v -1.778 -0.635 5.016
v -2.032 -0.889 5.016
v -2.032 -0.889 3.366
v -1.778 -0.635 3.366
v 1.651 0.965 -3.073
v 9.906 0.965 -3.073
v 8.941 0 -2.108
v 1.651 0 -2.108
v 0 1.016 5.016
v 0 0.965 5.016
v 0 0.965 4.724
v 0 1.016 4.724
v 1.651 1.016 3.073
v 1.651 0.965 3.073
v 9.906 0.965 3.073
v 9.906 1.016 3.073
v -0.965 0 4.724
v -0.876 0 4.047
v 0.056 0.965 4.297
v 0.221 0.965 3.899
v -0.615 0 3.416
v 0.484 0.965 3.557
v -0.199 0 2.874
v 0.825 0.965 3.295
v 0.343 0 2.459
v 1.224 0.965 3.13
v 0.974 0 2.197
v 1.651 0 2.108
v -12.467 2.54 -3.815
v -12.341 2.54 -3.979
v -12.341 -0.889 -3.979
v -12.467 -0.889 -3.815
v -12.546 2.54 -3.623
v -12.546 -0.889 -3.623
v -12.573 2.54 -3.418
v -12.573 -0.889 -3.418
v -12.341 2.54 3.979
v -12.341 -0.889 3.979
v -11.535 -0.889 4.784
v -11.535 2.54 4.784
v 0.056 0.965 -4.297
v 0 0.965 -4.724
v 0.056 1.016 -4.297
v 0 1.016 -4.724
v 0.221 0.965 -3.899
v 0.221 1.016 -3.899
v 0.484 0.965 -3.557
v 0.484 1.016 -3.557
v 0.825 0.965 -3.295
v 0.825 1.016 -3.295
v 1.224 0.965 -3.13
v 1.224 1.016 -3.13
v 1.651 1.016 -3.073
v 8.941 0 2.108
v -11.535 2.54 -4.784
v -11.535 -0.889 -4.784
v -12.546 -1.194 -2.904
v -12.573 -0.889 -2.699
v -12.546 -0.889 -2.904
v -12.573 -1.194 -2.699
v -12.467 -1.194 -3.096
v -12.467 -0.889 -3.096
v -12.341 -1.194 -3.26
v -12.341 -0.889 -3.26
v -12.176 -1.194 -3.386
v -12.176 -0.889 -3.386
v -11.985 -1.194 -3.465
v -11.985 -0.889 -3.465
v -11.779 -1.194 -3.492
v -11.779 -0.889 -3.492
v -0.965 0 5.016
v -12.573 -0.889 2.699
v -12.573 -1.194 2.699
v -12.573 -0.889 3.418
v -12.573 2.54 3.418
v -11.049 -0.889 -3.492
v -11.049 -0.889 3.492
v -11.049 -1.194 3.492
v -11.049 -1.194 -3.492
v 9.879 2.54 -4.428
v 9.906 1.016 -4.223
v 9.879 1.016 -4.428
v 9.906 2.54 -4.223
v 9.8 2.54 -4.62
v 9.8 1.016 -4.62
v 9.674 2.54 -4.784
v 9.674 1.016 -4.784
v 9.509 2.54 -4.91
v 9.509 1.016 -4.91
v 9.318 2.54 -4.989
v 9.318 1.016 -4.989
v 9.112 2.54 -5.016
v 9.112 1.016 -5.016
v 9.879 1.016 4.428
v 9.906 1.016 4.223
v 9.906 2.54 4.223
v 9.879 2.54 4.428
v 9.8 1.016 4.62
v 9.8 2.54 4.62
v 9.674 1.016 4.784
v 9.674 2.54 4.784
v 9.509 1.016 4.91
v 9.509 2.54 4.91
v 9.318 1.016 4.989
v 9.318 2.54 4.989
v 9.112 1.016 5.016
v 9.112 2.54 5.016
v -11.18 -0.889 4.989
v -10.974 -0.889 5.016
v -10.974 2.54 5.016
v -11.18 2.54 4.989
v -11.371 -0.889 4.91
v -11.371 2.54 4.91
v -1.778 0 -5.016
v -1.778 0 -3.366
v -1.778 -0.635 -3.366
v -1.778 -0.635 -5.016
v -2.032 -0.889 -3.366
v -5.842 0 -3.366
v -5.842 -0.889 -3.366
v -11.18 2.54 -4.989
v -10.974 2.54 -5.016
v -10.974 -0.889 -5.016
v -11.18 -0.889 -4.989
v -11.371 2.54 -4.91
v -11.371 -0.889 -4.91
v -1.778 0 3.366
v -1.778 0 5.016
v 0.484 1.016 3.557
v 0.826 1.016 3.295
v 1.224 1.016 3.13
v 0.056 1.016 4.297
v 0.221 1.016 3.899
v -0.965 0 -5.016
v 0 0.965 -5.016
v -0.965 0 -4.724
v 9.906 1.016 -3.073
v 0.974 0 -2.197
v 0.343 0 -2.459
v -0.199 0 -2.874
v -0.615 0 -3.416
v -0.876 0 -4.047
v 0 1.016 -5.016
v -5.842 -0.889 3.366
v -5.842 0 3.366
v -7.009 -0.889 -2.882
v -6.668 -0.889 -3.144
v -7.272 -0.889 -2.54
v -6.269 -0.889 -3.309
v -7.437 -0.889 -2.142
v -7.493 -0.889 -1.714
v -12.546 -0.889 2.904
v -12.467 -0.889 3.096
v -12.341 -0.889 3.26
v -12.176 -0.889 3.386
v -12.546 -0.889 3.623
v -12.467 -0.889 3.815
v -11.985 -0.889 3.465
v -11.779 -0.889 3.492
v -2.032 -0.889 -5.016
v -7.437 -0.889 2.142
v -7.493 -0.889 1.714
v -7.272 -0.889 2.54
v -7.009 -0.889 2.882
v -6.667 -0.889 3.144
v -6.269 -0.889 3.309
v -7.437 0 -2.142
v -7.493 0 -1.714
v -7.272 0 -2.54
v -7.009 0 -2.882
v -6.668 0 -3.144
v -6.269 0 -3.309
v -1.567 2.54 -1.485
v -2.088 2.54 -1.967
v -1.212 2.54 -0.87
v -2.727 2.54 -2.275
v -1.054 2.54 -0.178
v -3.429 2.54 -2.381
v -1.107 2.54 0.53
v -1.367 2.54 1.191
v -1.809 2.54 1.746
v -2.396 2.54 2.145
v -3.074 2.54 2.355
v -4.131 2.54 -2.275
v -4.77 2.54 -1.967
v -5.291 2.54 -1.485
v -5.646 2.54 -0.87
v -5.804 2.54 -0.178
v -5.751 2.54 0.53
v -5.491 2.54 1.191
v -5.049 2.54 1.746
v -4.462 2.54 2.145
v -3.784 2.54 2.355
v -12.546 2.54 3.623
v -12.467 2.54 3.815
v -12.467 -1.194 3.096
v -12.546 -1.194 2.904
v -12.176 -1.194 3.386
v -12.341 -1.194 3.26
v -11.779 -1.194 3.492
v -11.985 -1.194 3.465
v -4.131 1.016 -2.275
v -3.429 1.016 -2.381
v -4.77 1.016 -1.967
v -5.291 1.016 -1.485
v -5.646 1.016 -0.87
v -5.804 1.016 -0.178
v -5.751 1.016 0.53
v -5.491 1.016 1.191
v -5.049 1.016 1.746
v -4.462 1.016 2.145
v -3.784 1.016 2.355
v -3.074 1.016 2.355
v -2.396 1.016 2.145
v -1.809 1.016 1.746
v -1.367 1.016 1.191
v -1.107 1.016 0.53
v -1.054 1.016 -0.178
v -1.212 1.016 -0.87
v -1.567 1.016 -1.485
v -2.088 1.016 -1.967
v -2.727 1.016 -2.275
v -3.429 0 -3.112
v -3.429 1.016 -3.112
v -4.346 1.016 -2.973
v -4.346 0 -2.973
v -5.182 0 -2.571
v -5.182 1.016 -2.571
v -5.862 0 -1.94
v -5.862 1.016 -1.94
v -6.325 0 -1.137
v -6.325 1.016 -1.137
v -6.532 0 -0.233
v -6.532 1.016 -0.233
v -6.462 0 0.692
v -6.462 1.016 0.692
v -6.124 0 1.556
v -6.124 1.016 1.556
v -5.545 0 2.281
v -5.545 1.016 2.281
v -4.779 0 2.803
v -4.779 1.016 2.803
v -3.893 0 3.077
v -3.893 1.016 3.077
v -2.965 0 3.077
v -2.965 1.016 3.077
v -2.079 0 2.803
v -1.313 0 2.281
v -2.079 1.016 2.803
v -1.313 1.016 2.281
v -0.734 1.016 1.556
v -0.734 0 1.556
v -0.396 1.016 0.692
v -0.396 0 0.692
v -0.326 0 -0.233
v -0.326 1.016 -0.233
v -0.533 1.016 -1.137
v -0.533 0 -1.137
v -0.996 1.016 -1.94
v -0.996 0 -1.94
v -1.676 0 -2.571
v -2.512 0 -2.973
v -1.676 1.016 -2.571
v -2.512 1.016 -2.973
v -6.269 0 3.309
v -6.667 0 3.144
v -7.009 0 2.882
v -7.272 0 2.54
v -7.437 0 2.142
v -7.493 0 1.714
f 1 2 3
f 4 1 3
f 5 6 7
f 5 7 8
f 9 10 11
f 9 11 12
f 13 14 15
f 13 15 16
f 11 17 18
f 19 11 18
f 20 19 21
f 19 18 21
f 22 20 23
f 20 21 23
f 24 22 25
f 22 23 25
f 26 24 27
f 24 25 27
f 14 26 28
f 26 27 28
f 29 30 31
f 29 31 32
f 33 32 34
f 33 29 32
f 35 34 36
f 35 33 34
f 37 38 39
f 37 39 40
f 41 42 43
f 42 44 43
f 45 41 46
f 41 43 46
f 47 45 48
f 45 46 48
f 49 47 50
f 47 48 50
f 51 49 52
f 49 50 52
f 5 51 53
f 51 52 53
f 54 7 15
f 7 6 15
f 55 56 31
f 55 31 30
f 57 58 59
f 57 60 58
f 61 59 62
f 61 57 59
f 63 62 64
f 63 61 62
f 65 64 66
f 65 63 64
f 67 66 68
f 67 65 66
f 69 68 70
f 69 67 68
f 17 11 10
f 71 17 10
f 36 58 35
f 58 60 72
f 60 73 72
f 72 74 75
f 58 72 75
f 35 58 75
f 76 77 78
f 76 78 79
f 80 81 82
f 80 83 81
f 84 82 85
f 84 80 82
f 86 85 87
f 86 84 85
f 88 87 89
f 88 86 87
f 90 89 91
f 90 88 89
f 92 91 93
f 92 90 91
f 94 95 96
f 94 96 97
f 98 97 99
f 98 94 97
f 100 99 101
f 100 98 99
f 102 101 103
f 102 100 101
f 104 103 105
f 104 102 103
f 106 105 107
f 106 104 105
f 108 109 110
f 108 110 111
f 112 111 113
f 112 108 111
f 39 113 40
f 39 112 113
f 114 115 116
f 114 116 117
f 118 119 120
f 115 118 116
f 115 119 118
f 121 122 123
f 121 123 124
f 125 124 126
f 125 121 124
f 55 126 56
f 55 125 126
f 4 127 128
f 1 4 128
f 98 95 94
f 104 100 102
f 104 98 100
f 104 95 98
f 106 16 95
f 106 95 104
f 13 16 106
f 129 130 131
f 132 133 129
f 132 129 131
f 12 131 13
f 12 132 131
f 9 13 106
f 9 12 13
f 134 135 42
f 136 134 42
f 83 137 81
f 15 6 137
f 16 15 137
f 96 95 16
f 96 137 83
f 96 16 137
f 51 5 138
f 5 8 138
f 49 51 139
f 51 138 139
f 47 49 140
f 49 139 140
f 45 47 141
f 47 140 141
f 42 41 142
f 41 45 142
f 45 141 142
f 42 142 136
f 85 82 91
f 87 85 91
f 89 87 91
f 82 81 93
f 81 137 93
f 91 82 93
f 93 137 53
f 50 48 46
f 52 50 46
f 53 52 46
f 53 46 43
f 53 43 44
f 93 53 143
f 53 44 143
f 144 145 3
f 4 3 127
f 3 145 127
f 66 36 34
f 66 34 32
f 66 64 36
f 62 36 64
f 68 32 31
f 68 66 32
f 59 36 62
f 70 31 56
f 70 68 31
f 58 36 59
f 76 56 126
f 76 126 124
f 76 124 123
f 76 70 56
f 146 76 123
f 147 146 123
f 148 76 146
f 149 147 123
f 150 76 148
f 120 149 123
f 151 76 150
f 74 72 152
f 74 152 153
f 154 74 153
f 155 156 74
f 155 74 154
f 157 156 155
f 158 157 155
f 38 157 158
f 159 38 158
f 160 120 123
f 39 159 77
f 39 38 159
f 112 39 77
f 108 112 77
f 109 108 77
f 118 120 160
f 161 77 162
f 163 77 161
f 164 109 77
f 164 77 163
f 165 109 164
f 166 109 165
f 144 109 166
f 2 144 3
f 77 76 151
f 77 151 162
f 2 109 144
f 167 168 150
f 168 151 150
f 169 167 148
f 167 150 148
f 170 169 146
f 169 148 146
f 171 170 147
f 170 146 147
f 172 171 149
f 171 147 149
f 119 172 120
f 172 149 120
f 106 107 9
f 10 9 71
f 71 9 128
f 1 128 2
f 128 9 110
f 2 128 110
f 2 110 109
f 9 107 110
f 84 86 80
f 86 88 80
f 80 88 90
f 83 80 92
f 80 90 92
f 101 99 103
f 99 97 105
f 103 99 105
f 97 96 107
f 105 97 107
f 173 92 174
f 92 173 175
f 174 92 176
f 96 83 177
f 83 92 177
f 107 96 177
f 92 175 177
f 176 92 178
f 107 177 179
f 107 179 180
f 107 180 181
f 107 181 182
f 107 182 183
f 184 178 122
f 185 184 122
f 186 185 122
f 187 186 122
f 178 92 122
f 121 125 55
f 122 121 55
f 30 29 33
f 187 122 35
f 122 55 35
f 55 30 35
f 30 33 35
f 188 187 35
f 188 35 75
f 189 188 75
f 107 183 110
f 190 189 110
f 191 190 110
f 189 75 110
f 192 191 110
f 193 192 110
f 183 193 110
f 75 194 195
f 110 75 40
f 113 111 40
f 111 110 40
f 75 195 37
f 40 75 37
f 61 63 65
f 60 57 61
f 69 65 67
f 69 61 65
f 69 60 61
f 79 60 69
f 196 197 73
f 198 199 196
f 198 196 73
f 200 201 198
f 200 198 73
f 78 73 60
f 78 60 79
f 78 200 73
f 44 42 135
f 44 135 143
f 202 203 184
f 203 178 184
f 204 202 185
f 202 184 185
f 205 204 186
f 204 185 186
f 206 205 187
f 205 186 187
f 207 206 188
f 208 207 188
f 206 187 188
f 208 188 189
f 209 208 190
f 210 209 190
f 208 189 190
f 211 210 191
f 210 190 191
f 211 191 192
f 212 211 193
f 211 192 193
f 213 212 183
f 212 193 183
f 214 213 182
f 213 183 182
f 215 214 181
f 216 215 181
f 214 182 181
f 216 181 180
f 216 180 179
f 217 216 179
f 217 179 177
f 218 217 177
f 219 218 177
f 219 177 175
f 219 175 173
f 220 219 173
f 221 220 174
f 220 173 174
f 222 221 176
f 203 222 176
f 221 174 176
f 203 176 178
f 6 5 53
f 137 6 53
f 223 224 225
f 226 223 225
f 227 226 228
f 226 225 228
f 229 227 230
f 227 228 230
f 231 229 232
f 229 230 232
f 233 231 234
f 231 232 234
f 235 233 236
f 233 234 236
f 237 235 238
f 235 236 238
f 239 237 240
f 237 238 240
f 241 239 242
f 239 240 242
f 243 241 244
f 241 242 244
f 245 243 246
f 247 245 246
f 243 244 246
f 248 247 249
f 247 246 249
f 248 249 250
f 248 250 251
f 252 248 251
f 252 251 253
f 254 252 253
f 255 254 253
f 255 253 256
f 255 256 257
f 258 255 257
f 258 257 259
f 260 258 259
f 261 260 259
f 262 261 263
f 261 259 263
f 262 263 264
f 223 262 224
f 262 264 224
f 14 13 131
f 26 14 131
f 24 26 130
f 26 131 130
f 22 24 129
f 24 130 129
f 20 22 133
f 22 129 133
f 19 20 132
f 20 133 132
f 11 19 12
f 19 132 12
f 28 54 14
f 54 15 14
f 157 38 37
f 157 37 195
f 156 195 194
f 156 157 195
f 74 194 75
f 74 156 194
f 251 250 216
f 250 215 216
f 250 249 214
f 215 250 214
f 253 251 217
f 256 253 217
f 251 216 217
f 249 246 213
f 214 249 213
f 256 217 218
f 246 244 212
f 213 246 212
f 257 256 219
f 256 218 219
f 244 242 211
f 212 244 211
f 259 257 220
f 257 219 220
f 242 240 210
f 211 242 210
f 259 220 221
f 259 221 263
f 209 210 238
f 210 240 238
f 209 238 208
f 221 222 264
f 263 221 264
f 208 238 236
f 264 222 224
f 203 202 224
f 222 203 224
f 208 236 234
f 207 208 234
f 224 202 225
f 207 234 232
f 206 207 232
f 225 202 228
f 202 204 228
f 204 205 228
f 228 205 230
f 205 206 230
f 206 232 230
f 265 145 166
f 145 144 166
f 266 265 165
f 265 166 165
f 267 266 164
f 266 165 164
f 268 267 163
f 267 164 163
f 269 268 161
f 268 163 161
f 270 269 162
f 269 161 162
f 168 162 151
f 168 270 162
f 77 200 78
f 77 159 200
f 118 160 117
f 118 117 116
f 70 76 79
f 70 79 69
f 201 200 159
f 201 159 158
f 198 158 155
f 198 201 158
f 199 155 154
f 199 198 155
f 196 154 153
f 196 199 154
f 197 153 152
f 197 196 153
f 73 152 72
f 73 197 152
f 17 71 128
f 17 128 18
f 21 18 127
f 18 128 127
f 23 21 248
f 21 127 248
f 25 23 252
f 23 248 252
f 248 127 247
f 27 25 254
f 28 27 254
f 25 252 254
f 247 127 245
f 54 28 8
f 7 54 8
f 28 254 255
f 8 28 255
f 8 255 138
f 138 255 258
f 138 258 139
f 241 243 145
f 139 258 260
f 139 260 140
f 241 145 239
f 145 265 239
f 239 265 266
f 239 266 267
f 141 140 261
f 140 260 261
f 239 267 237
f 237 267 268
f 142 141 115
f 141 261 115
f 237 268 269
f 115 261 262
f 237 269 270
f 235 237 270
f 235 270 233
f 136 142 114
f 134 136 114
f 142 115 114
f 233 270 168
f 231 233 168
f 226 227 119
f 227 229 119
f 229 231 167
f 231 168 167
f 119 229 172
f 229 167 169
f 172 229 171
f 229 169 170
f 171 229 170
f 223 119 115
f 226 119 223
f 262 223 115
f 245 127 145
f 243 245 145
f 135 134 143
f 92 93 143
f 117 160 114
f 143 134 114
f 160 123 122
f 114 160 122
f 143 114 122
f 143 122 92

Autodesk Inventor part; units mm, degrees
ref_plane "YZ Plane" through (0, 0, 0) normal (1, 0, 0) x (0, 1, 0)
ref_plane "XZ Plane" through (0, 0, 0) normal (0, 1, 0) x (-1, 0, 0)
ref_plane "XY Plane" through (0, 0, 0) normal (0, 0, 1) x (1, 0, 0)
sketch "Sketch1" plane through (0, 0, 0) normal (1, 0, 0) x (0, 1, 0)
  line L0 (-2.1432, 0) -> (4.5023, 0) projected
  line L1 (0, 7.0231) -> (0, -7.0231) projected
  line L2 (2.54, -5.0165) -> (2.54, 5.0165)
  line L3 (2.54, 5.0165) -> (0, 5.0165)
  line L4 (0, 5.0165) -> (0, -5.0165)
  line L5 (0, -5.0165) -> (2.54, -5.0165)
  line L6 (2.54, -5.0165) -> (0, 5.0165) construction
  line L7 (2.54, 5.0165) -> (0, -5.0165) construction
  line L8 (0, 3.0734) -> (1.016, 3.0734)
  line L9 (1.016, 3.0734) -> (1.016, 5.0165)
  line L10 (0, -3.0734) -> (1.016, -3.0734)
  line L11 (1.016, -3.0734) -> (1.016, -5.0165)
  line L12 (1.27, 0) -> (3.553, 0) construction
  point P0 (0, 0)
  dimension "d0" = 10.033
  dimension "d1" = 2.54
  dimension "d2" = 0
  dimension "d3" = 1.016
  dimension "d4" = 6.1468
  dimension "d5" = 1.9431
  dimension "d6" = 1.9431
extrude "Extrusion1" add sketch "Sketch1" along normal blind 9.906 contours L1 L8 L9 L3 L2 L0 | L0 L2 L5 L11 L10 L1
extrude "Extrusion2" add sketch "Sketch1" against normal blind 12.573
sketch "Sketch2" plane through (0, 0, 0) normal (0, 1, 0) x (-1, 0, 0)
  line L0 (-2.3558, 0) -> (14.1351, 0) projected
  line L1 (0, -4.445) -> (0, 4.445) projected
  point P0 (0, 0)
  point P1 (3.429, 0)
  dimension "d11" = 3.429
hole "Hole1" at (-3.429, 0, 0) direction (0, 1, 0) diameter 4.7625 end through all counterbore diameter 6.223 counterbore depth 1.016
sketch "Sketch3" plane through (9.906, 0, -3.0734) normal (0, -1, 0) x (1, 0, 0)
  line L0 (-22.479, 6.4389) -> (-17.399, 6.4389)
  line L1 (-17.399, 6.4389) -> (-17.399, -0.2921)
  line L2 (-17.399, -0.2921) -> (-22.479, -0.2921)
  line L3 (-22.479, -0.2921) -> (-22.479, 6.4389)
  line L4 (-34.3558, 3.0734) -> (5.726, 3.0734) projected
  line L5 (-9.906, 10.1016) -> (-9.906, -3.9802) projected
  line L6 (-9.906, 3.0734) -> (-28.6298, 3.0734) construction
  line L7 (-22.479, 8.0899) -> (0, 8.0899) projected
  line L8 (-22.479, 6.4389) -> (-11.684, 6.4389)
  line L9 (-11.684, 6.4389) -> (-11.684, 8.0899)
  line L10 (-11.684, 8.0899) -> (-22.479, 8.0899)
  line L11 (-22.479, 8.0899) -> (-22.479, 6.4389)
  line L12 (0, -1.9431) -> (-22.479, -1.9431) projected
  line L13 (-22.479, -0.2921) -> (-11.684, -0.2921)
  line L14 (-11.684, -0.2921) -> (-11.684, -1.9431)
  line L15 (-11.684, -1.9431) -> (-22.479, -1.9431)
  line L16 (-22.479, -1.9431) -> (-22.479, -0.2921)
  dimension "d22" = 5.08
  dimension "d30" = 6.731
  dimension "d45" = 10.795
  dimension "d46" = 10.795
extrude "Extrusion3" add sketch "Sketch3" along normal blind 0.889 contours L11 L7 L9 L8 L0 | L0 L1 L4 L3 | L4 L1 L2 L3 | L2 L13 L14 L12 L16
chamfer "Chamfer2" distance 0.254 angle 45 2 edges at (-1.778, -0.889, 4.191) (-1.778, -0.889, -4.191)
fillet "Fillet1" radius 0.7937 2 edges at (9.906, 1.778, 5.0165) (9.906, 1.778, -5.0165)
fillet "Fillet2" [suppressed]
sketch "Sketch4" plane through (0, 0, 0) normal (0, 1, 0) x (-1, 0, 0)
  circle A0 centre (3.429, 0) radius 2.3813 projected
  circle A1 centre (3.429, 0) radius 3.175
  point P0 (0, 0)
  dimension "d34" = 6.35
sketch "Sketch5" plane through (9.906, -0.889, -3.0734) normal (0, -1, 0) x (1, 0, 0)
  line L0 (-26.9748, 3.0734) -> (4.4958, 3.0734) projected
  line L1 (-9.906, 10.0965) -> (-9.906, -3.9497) projected
  line L2 (-22.479, 8.0899) -> (-22.479, -1.9431) projected
  line L3 (-20.955, -0.4191) -> (-22.479, -0.4191)
  line L4 (-22.479, -0.4191) -> (-22.479, 6.5659)
  line L5 (-22.479, 6.5659) -> (-20.955, 6.5659)
  line L6 (-20.955, 6.5659) -> (-20.955, -0.4191)
  line L7 (-20.955, -0.4191) -> (-22.479, 6.5659) construction
  line L8 (-22.479, -0.4191) -> (-20.955, 6.5659) construction
  point P0 (-9.906, 3.0734)
  point P1 (-21.717, 3.0734)
  dimension "d47" = 6.985
  dimension "d48" = 1.524
extrude "Extrusion4" add sketch "Sketch5" along normal blind 0.3048
chamfer "Chamfer4" distance 1.27 distance2 1.27 1 edges at (-12.573, 0.8255, -5.0165) measured on face at (-12.573, 1.397, 1.1642)
chamfer "Chamfer5" distance 1.27 distance2 1.27 1 edges at (-12.573, 0.8255, 5.0165) measured on face at (-9.0593, 0.254, 5.0165)
fillet "Fillet4" radius 0.7937 2 edges at (-12.573, -1.0414, -3.4925) (-12.573, -1.0414, 3.4925)
fillet "Fillet5" radius 0.7937 4 edges at (-12.573, 0.8255, 3.7465) (-11.303, 0.8255, 5.0165) (-12.573, 0.8255, -3.7465) (-11.303, 0.8255, -5.0165)
fillet "Fillet6" radius 1.651 4 edges at (0, 0.508, -3.0734) (0, 0.508, 3.0734) (-7.493, -0.4445, 3.3655) (-7.493, -0.4445, -3.3655)
sketch "Sketch6" plane through (0, 0, 0) normal (0, 0, 1) x (1, 0, 0)
  line L0 (-11.049, -1.1938) -> (-11.7793, -1.1938) projected
  line L1 (-11.049, -0.889) -> (-11.049, -1.1938) projected
  line L2 (-2.032, -0.889) -> (-10.9742, -0.889) projected
  line L3 (-11.049, -1.1938) -> (-2.032, -0.889)
  point P0 (0, 0)
  dimension "d51" = 1.936
chamfer "Chamfer6" distance 0.9652 angle 45 4 edges at (5.7785, 0, -3.0734) (0, 0, -4.8704) (5.7785, 0, 3.0734) (0, 0, 4.8704) measured on face at (7.1543, 0, 1.0245)
chamfer "Chamfer7" distance 0.9652 angle 45 1 edges at (9.906, 0, 0)
properties part number "J010513" material "STAINLESS STEEL, 303"
